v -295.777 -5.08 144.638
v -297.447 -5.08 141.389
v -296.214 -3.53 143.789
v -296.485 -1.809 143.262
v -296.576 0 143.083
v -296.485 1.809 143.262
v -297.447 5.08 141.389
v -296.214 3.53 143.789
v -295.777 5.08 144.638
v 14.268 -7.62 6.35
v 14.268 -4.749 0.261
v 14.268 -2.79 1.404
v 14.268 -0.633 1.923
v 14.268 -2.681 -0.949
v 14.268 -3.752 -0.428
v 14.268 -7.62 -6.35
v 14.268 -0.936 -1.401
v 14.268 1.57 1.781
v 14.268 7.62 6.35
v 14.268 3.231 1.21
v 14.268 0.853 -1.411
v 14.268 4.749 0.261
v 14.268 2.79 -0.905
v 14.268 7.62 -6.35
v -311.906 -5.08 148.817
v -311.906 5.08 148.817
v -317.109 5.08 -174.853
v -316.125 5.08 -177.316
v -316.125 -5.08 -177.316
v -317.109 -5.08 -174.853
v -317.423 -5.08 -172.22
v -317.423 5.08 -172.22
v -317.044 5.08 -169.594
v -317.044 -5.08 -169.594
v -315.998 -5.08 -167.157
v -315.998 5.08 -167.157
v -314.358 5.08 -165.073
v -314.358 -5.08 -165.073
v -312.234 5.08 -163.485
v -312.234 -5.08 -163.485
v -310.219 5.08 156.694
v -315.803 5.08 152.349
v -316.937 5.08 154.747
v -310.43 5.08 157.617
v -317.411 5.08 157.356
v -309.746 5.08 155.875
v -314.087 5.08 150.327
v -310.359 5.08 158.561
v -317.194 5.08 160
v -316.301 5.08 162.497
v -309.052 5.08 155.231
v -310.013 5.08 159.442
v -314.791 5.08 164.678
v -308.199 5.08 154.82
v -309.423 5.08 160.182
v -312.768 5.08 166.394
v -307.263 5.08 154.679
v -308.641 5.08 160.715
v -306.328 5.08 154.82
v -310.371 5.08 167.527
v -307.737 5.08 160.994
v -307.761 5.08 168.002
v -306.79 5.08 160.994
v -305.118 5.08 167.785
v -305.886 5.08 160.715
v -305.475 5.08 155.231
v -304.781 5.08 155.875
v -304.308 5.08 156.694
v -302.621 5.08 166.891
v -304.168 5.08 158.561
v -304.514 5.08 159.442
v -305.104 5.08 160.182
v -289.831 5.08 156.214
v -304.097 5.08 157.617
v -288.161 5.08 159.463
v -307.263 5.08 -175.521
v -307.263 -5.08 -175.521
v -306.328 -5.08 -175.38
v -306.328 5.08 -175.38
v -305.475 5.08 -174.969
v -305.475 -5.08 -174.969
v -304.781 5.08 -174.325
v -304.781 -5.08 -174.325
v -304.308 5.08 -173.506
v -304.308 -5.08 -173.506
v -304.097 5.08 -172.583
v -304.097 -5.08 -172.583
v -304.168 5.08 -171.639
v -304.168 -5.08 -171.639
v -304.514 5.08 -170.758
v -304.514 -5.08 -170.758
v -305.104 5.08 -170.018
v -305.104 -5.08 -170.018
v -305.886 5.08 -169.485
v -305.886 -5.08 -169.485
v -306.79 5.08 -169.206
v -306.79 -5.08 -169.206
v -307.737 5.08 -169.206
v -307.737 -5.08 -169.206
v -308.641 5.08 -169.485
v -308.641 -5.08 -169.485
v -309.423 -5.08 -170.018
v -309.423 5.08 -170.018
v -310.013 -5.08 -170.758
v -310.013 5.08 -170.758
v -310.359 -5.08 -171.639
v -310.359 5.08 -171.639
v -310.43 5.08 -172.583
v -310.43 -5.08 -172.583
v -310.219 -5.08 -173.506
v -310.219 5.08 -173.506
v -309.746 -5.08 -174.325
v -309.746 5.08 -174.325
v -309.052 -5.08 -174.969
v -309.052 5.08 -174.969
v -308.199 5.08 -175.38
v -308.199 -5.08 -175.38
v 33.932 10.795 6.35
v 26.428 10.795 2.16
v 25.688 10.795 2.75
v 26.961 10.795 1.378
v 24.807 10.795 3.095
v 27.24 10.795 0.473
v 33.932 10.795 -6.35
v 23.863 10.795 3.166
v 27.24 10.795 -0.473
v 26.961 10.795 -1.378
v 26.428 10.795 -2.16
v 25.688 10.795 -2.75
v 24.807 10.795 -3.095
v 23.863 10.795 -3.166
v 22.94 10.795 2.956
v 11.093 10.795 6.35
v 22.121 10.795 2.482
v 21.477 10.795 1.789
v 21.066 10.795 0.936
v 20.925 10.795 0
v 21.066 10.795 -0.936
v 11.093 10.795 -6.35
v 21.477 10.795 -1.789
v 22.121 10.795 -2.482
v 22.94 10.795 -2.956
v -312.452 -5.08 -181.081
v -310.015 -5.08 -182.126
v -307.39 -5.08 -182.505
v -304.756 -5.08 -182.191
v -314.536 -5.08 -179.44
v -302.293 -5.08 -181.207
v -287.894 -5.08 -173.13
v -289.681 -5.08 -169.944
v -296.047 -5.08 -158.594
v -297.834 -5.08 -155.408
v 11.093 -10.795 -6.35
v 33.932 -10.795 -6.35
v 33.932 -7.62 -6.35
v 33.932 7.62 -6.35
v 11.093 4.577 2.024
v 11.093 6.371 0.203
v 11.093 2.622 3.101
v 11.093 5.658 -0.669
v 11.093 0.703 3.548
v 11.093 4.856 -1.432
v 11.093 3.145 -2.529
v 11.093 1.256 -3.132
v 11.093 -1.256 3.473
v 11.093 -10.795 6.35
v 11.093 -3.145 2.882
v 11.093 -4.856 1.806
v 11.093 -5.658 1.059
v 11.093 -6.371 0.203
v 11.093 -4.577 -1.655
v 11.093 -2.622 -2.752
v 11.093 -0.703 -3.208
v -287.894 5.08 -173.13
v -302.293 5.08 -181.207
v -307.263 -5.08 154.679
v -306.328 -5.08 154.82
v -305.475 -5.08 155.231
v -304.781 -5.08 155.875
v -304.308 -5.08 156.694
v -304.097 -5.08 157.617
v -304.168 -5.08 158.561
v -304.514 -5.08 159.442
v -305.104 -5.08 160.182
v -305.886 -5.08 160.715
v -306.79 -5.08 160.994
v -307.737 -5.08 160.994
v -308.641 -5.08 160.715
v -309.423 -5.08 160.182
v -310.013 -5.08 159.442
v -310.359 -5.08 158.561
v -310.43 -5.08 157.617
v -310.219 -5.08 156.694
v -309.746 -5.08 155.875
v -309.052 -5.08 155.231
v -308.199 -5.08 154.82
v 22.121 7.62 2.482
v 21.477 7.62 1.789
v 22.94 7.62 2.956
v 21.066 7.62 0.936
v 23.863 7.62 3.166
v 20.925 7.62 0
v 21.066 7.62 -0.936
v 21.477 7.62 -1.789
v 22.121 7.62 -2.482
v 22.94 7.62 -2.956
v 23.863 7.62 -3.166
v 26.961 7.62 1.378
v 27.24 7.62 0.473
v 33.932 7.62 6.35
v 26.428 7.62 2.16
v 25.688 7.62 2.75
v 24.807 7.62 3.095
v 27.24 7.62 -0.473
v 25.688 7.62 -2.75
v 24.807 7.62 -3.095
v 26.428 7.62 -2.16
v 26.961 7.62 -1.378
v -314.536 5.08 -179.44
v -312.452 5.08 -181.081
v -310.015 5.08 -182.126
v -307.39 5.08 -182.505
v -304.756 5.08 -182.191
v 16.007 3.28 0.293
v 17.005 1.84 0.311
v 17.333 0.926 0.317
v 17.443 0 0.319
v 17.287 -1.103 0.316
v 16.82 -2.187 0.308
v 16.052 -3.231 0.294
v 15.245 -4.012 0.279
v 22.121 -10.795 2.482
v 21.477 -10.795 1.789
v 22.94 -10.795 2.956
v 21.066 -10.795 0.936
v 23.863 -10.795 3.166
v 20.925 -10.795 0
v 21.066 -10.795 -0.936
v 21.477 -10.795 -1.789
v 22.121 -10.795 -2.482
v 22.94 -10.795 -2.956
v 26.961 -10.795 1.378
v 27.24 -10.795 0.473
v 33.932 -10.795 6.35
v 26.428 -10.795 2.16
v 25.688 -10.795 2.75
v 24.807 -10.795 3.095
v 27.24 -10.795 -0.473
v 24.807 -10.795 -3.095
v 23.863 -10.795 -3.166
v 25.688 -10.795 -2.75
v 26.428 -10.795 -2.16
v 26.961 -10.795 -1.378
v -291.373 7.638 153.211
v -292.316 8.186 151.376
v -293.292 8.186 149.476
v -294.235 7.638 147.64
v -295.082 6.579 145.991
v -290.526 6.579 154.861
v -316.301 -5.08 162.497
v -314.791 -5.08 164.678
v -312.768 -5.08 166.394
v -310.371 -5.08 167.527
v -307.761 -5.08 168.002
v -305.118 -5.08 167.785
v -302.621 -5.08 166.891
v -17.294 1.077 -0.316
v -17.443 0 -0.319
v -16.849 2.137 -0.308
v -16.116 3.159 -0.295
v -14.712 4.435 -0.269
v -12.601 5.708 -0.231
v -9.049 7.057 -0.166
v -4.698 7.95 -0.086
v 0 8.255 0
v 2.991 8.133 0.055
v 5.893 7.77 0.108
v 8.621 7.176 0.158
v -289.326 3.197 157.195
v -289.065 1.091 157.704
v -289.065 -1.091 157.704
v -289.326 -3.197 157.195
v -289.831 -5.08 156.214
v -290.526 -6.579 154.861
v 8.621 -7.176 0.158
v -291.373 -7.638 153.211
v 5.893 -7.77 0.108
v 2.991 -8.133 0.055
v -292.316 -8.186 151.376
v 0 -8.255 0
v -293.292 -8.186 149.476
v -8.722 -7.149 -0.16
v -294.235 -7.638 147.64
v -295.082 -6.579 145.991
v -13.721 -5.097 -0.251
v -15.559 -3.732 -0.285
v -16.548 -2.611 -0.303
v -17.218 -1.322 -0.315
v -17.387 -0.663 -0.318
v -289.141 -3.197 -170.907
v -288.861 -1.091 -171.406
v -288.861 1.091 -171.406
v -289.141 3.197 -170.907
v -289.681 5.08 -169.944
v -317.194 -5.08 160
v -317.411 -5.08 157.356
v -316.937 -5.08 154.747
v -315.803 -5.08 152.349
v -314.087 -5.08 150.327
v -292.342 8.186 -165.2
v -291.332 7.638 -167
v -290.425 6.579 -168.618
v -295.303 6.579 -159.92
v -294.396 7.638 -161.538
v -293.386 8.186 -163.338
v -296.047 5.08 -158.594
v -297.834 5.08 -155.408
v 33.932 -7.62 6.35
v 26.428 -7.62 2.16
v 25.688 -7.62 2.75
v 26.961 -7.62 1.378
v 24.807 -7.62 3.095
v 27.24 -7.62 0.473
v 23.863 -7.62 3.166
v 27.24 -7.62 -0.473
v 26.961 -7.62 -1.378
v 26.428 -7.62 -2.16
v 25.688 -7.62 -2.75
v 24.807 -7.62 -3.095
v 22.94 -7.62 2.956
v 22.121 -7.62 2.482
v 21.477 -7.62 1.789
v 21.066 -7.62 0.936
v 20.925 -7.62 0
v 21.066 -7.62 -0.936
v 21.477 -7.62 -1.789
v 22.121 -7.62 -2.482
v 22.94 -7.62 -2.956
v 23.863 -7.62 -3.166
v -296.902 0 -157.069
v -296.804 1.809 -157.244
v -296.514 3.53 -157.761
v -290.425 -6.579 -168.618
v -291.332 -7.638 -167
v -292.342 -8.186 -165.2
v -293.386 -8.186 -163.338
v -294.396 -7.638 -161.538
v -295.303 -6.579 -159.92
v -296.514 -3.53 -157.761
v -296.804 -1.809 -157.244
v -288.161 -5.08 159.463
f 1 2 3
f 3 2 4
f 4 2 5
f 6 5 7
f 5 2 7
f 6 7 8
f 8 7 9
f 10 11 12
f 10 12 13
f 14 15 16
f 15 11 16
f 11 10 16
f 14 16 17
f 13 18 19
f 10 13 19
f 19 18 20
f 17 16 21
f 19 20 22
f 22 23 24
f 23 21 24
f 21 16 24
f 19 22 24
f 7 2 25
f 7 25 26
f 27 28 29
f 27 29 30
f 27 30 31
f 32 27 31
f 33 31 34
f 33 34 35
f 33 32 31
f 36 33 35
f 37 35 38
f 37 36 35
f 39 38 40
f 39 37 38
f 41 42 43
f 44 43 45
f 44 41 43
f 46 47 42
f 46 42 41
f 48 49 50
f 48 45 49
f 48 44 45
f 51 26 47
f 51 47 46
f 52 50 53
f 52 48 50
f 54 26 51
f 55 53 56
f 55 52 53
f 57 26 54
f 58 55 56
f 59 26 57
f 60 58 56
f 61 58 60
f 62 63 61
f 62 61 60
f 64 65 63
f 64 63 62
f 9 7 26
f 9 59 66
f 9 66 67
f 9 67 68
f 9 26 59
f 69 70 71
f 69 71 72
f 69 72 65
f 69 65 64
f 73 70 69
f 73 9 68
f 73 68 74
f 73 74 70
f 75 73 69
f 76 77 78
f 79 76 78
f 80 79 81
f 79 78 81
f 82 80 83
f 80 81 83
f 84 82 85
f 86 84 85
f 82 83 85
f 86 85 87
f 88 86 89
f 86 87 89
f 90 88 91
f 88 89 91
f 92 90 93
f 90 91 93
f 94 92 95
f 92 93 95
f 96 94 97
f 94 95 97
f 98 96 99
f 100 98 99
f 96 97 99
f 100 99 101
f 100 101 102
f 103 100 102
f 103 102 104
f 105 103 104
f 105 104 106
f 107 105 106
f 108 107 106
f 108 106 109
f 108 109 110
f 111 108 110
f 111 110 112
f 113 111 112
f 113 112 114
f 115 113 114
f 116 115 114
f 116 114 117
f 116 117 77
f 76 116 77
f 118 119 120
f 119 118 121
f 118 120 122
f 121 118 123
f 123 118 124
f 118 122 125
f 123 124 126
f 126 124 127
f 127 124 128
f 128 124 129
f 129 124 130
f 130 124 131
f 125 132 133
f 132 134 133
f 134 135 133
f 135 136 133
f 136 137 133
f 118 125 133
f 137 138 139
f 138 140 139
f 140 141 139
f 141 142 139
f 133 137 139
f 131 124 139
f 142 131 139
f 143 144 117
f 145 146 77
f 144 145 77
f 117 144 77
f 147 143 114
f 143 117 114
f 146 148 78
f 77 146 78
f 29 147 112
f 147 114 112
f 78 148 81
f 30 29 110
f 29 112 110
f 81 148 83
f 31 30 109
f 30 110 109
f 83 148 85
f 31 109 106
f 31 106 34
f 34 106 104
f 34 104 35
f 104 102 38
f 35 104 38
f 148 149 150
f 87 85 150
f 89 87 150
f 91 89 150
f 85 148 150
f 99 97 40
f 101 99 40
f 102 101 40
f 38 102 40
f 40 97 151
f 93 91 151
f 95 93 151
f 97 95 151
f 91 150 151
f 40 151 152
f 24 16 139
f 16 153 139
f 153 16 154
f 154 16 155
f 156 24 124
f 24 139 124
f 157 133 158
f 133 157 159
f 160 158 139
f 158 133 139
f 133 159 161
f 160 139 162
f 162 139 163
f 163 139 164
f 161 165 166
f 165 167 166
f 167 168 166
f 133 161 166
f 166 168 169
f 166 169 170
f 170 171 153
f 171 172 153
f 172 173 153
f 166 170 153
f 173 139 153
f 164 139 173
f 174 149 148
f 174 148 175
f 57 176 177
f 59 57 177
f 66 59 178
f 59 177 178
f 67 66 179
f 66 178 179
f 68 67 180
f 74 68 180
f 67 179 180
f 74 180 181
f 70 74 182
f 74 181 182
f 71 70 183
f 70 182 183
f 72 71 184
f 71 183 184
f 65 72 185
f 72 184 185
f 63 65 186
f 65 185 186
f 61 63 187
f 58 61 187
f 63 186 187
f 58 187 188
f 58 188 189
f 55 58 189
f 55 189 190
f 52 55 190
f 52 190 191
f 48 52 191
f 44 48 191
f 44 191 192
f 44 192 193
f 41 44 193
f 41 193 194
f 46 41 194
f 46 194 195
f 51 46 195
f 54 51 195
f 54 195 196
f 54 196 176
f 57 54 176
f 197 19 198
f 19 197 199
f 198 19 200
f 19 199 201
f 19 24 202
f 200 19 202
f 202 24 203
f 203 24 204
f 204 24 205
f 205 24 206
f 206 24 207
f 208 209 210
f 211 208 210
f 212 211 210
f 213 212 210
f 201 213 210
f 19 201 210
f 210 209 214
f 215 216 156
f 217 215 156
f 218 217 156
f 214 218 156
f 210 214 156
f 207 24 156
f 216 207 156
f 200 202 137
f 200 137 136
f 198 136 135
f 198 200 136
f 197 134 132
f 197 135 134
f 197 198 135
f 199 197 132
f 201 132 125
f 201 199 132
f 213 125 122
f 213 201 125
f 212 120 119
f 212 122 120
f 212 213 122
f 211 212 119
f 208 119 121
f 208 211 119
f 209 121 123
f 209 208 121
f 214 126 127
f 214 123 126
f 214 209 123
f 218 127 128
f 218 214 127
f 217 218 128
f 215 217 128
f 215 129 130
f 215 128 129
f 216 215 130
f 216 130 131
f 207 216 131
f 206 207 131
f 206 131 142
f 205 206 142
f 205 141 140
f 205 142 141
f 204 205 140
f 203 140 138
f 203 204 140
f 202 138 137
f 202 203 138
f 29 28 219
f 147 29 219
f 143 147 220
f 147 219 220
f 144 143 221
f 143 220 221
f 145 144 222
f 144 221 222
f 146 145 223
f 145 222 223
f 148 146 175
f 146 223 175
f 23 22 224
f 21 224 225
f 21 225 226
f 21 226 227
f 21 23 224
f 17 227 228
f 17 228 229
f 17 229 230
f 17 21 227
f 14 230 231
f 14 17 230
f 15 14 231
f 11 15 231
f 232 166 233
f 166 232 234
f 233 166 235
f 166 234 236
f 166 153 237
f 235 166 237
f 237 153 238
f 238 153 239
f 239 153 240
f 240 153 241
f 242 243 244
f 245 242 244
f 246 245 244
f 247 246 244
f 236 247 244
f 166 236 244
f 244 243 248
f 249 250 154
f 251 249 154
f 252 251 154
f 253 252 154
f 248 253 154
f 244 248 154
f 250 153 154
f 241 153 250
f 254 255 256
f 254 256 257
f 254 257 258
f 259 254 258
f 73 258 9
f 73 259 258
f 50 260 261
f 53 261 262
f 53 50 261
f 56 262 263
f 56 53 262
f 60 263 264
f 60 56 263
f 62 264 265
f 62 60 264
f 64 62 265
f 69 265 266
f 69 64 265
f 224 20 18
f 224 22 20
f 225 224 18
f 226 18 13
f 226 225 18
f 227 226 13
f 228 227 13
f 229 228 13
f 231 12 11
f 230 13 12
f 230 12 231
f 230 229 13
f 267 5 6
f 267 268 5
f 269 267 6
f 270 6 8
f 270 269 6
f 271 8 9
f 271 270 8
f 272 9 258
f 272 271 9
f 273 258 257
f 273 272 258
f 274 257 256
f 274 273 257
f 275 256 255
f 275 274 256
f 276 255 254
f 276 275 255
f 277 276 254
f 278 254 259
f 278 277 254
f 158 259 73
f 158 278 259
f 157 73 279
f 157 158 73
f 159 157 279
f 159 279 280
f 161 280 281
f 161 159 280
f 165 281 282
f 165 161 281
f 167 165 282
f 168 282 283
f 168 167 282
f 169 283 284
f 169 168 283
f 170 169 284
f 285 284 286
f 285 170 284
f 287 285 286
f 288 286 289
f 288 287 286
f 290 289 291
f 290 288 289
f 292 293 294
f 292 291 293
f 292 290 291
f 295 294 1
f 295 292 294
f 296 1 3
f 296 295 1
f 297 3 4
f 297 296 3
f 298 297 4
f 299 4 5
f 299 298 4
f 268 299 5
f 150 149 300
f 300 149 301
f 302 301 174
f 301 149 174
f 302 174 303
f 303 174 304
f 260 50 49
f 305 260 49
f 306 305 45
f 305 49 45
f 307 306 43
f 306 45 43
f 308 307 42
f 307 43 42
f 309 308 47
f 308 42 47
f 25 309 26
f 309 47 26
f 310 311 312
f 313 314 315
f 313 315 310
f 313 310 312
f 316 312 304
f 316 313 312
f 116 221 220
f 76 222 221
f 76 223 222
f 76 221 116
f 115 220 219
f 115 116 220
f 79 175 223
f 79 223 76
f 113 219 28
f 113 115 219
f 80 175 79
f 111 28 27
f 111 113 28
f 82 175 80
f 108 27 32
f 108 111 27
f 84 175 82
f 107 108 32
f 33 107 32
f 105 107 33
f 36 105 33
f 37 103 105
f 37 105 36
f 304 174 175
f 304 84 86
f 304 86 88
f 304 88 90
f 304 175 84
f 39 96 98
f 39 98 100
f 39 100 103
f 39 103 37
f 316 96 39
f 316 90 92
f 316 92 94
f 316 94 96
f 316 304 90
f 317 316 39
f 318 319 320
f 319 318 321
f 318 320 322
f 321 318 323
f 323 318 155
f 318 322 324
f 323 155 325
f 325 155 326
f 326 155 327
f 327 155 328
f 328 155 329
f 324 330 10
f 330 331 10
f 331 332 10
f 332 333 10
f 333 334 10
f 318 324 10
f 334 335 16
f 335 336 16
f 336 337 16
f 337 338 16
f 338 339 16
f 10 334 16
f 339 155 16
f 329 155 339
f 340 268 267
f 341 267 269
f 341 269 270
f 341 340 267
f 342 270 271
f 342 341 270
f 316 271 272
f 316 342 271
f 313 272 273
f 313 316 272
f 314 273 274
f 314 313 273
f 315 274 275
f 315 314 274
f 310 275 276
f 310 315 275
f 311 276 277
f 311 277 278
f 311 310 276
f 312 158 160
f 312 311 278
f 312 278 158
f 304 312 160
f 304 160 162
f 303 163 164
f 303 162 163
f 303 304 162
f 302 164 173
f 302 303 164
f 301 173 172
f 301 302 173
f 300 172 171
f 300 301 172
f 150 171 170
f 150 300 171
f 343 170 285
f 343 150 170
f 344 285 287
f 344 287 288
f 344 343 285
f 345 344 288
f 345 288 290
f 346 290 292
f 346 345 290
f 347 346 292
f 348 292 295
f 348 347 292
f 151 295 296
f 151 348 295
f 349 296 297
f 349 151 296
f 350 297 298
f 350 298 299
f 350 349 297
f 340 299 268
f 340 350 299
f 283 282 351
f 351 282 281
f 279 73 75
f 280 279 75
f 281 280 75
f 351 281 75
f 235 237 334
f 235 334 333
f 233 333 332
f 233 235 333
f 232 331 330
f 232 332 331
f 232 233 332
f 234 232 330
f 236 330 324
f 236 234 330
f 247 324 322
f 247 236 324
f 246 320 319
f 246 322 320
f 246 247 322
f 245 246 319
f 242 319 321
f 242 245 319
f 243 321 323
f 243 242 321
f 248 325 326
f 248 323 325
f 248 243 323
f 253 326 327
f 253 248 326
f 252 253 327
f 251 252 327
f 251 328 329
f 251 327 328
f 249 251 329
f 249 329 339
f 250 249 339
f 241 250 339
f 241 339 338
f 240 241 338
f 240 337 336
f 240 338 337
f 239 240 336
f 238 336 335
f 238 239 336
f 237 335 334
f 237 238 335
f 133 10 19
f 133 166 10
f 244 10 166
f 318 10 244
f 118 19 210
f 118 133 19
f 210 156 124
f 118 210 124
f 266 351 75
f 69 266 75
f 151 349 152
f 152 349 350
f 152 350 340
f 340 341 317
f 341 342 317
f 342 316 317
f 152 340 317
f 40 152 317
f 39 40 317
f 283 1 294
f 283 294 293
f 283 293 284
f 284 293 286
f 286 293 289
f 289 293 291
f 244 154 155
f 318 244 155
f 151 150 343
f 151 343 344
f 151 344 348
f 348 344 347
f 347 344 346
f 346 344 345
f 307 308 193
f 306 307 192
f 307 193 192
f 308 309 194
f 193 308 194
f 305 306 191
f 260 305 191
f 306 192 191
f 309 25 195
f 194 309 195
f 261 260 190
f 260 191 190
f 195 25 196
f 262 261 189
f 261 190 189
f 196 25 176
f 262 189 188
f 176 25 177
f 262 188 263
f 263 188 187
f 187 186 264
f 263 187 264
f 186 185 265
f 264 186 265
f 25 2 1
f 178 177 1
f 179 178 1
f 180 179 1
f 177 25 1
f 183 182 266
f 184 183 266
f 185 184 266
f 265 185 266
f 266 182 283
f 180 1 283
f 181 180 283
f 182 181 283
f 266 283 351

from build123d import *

# Parameters (mm, degrees)
SKETCH2_R                   = 8.255
BOSS_EXTRUDE1_DEPTH         = 6.35
BOSS_EXTRUDE1_DEPTH_BACK    = 6.35
BOSS_EXTRUDE2_DEPTH         = 10.16
BOSS_EXTRUDE2_DEPTH_BACK    = 16.256
SKETCH4_W                   = 20.32
SKETCH4_H                   = 10.16
BOSS_EXTRUDE3_DEPTH         = 10.16
BOSS_EXTRUDE3_DEPTH_BACK    = 16.51
SKETCH5_W                   = 20.32
SKETCH5_H                   = 10.16
CUT_EXTRUDE1_DEPTH          = 372.505050517
CUT_EXTRUDE2_DEPTH          = 370.547039673
CUT_EXTRUDE3_START          = -16.256
CUT_EXTRUDE3_DEPTH          = 16.256
CUT_EXTRUDE4_DEPTH          = 16.51
E_0_25_DIAMETER_HOLE1_D     = 6.35
E_0_25_DIAMETER_HOLE1_DEPTH = 19.05
E_0_25_DIAMETER_HOLE1_TIP   = 1.907732465
CUT_EXTRUDE5_DEPTH          = 367.61301524
CUT_EXTRUDE5_DEPTH_BACK     = 367.61301524
SKETCH13_R                  = 3.175


with BuildPart() as part:
    # Sweep1: sweep along a path in Sketch1
    with BuildLine(Plane(origin=(0, 0, 0), x_dir=(1, 0, 0), z_dir=(0, 1, 0))) as sweep1_path:
        Line((-307.263447944, -157.854259231), (0, 0))
        Line((0, 0), (-307.263447944, 172.345740769))
    # Sketch2 → Sweep1 (sweep)
    with BuildSketch(Plane(origin=(-307.263447944, 0, 157.854259231), x_dir=(-0.45696578054298637, 0, -0.8894842749665333), z_dir=(0.8894842749665333, 0, -0.45696578054298637))):
        Circle(SKETCH2_R)
    sweep(path=sweep1_path.line, transition=Transition.RIGHT)

    # Sketch3 → Boss-Extrude1 (add, two sides: drawn at the far end of the back side and taken through both)
    with BuildSketch(Plane.XY.offset(-BOSS_EXTRUDE1_DEPTH_BACK)):
        Polygon((33.931753368, 10.795), (11.09345, 10.795), (11.09345, -10.795), (33.931753368, -10.795), (33.931753368, -7.62), (14.26845, -7.62), (14.26845, 7.62), (33.931753368, 7.62), align=None)
    extrude(amount=BOSS_EXTRUDE1_DEPTH + BOSS_EXTRUDE1_DEPTH_BACK)

    # Sketch4 → Boss-Extrude2 (add, two sides: drawn at the far end of the back side and taken through both)
    with BuildSketch(Plane(origin=(-307.263447944, 0, 157.854259231), x_dir=(0.45696578054298637, 0, 0.8894842749665333), z_dir=(-0.8894842749665333, 0, 0.45696578054298637)).offset(-BOSS_EXTRUDE2_DEPTH_BACK)):
        Rectangle(SKETCH4_W, SKETCH4_H)
    extrude(amount=BOSS_EXTRUDE2_DEPTH + BOSS_EXTRUDE2_DEPTH_BACK)

    # Sketch5 → Boss-Extrude3 (add, two sides: drawn at the far end of the back side and taken through both)
    with BuildSketch(Plane(origin=(-307.263447944, 0, -172.345740769), x_dir=(-0.4892044257112748, 0, 0.8721691520940774), z_dir=(-0.8721691520940774, 0, -0.4892044257112748)).offset(-BOSS_EXTRUDE3_DEPTH_BACK)):
        Rectangle(SKETCH5_W, SKETCH5_H)
    extrude(amount=BOSS_EXTRUDE3_DEPTH + BOSS_EXTRUDE3_DEPTH_BACK)

    # Sketch6 → Cut-Extrude1 (cut, through all)
    with BuildSketch(Plane(origin=(0, 5.08, 0), x_dir=(1, 0, 0), z_dir=(0, 1, 0))):
        with BuildLine():
            Line((-312.23376491, 163.484502184), (-321.095003495, 168.454819149))
            Line((-321.095003495, 168.454819149), (-316.12468653, 177.316057734))
            ThreePointArc((-316.12468653, 177.316057734), (-317.043834669, 169.594443707), (-312.23376491, 163.484502184))
        make_face()
    cut_extrude1 = extrude(amount=-CUT_EXTRUDE1_DEPTH, mode=Mode.SUBTRACT)

    # Mirror1: Cut-Extrude1 across plane
    add(cut_extrude1.mirror(Plane(origin=(0, 0, 0), x_dir=(0.8721691520940776, 0, 0.48920442571127426), z_dir=(-0.4892044257112748, 0, 0.8721691520940775))), mode=Mode.SUBTRACT)

    # Sketch7 → Cut-Extrude2 (cut, through all)
    with BuildSketch(Plane(origin=(0, 5.08, 0), x_dir=(1, 0, 0), z_dir=(0, 1, 0))):
        with BuildLine():
            Line((-302.620675614, -166.891419464), (-311.657835848, -171.534191795))
            Line((-311.657835848, -171.534191795), (-316.300608178, -162.497031561))
            ThreePointArc((-316.300608178, -162.497031561), (-310.37074943, -167.527432313), (-302.620675614, -166.891419464))
        make_face()
    cut_extrude2 = extrude(amount=-CUT_EXTRUDE2_DEPTH, mode=Mode.SUBTRACT)

    # Mirror2: Cut-Extrude2 across plane
    add(cut_extrude2.mirror(Plane(origin=(0, 0, 0), x_dir=(-0.8894842749665333, 0, 0.45696578054298614), z_dir=(0.45696578054298637, 0, 0.8894842749665333))), mode=Mode.SUBTRACT)

    # Sketch8 → Cut-Extrude3 (cut)
    with BuildSketch(Plane(origin=(-307.263447944, 0, 157.854259231), x_dir=(0.45696578054298637, 0, 0.8894842749665333), z_dir=(-0.8894842749665333, 0, 0.45696578054298637)).offset(CUT_EXTRUDE3_START)):
        with BuildLine():
            Line((6.506813736, -5.08), (-6.506813736, -5.08))
            ThreePointArc((-6.506813736, -5.08), (0, -8.255), (6.506813736, -5.08))
        make_face()
        with BuildLine():
            Line((-6.506813736, 5.08), (6.506813736, 5.08))
            ThreePointArc((6.506813736, 5.08), (0, 8.255), (-6.506813736, 5.08))
        make_face()
    extrude(amount=CUT_EXTRUDE3_DEPTH, mode=Mode.SUBTRACT)

    # Sketch9 → Cut-Extrude4 (cut)
    with BuildSketch(Plane(origin=(-307.263447944, 0, -172.345740769), x_dir=(-0.4892044257112748, 0, 0.8721691520940774), z_dir=(-0.8721691520940774, 0, -0.4892044257112748))):
        with BuildLine():
            Line((6.506813736, -5.08), (-6.506813736, -5.08))
            ThreePointArc((-6.506813736, -5.08), (0, -8.255), (6.506813736, -5.08))
        make_face()
        with BuildLine():
            Line((-6.506813736, 5.08), (6.506813736, 5.08))
            ThreePointArc((6.506813736, 5.08), (0, 8.255), (-6.506813736, 5.08))
        make_face()
    extrude(amount=-CUT_EXTRUDE4_DEPTH, mode=Mode.SUBTRACT)

    # E (0.25) Diameter Hole1
    with Locations(Plane(origin=(-307.263447944, 5.08, -172.345740769), x_dir=(0, 0, 1), z_dir=(0, 1, 0))):
        with Locations((0, 0), (330.2, 0)):
            Hole(E_0_25_DIAMETER_HOLE1_D / 2, depth=E_0_25_DIAMETER_HOLE1_DEPTH)
            with Locations((0, 0, -(E_0_25_DIAMETER_HOLE1_DEPTH + E_0_25_DIAMETER_HOLE1_TIP / 2))):  # 118° drill point
                Cone(0, E_0_25_DIAMETER_HOLE1_D / 2, E_0_25_DIAMETER_HOLE1_TIP, mode=Mode.SUBTRACT)

    # Sketch13 → Cut-Extrude5 (cut, two sides: drawn at the far end of the back side and taken through both)
    with BuildSketch(Plane(origin=(0, -7.62, 0), x_dir=(1, 0, 0), z_dir=(0, 1, 0)).offset(-CUT_EXTRUDE5_DEPTH_BACK)):
        with Locations(Location((24.100101684, 0, 0), (0, 0, 180))):
            Circle(SKETCH13_R)
    extrude(amount=CUT_EXTRUDE5_DEPTH + CUT_EXTRUDE5_DEPTH_BACK, mode=Mode.SUBTRACT)


solid = part.part
